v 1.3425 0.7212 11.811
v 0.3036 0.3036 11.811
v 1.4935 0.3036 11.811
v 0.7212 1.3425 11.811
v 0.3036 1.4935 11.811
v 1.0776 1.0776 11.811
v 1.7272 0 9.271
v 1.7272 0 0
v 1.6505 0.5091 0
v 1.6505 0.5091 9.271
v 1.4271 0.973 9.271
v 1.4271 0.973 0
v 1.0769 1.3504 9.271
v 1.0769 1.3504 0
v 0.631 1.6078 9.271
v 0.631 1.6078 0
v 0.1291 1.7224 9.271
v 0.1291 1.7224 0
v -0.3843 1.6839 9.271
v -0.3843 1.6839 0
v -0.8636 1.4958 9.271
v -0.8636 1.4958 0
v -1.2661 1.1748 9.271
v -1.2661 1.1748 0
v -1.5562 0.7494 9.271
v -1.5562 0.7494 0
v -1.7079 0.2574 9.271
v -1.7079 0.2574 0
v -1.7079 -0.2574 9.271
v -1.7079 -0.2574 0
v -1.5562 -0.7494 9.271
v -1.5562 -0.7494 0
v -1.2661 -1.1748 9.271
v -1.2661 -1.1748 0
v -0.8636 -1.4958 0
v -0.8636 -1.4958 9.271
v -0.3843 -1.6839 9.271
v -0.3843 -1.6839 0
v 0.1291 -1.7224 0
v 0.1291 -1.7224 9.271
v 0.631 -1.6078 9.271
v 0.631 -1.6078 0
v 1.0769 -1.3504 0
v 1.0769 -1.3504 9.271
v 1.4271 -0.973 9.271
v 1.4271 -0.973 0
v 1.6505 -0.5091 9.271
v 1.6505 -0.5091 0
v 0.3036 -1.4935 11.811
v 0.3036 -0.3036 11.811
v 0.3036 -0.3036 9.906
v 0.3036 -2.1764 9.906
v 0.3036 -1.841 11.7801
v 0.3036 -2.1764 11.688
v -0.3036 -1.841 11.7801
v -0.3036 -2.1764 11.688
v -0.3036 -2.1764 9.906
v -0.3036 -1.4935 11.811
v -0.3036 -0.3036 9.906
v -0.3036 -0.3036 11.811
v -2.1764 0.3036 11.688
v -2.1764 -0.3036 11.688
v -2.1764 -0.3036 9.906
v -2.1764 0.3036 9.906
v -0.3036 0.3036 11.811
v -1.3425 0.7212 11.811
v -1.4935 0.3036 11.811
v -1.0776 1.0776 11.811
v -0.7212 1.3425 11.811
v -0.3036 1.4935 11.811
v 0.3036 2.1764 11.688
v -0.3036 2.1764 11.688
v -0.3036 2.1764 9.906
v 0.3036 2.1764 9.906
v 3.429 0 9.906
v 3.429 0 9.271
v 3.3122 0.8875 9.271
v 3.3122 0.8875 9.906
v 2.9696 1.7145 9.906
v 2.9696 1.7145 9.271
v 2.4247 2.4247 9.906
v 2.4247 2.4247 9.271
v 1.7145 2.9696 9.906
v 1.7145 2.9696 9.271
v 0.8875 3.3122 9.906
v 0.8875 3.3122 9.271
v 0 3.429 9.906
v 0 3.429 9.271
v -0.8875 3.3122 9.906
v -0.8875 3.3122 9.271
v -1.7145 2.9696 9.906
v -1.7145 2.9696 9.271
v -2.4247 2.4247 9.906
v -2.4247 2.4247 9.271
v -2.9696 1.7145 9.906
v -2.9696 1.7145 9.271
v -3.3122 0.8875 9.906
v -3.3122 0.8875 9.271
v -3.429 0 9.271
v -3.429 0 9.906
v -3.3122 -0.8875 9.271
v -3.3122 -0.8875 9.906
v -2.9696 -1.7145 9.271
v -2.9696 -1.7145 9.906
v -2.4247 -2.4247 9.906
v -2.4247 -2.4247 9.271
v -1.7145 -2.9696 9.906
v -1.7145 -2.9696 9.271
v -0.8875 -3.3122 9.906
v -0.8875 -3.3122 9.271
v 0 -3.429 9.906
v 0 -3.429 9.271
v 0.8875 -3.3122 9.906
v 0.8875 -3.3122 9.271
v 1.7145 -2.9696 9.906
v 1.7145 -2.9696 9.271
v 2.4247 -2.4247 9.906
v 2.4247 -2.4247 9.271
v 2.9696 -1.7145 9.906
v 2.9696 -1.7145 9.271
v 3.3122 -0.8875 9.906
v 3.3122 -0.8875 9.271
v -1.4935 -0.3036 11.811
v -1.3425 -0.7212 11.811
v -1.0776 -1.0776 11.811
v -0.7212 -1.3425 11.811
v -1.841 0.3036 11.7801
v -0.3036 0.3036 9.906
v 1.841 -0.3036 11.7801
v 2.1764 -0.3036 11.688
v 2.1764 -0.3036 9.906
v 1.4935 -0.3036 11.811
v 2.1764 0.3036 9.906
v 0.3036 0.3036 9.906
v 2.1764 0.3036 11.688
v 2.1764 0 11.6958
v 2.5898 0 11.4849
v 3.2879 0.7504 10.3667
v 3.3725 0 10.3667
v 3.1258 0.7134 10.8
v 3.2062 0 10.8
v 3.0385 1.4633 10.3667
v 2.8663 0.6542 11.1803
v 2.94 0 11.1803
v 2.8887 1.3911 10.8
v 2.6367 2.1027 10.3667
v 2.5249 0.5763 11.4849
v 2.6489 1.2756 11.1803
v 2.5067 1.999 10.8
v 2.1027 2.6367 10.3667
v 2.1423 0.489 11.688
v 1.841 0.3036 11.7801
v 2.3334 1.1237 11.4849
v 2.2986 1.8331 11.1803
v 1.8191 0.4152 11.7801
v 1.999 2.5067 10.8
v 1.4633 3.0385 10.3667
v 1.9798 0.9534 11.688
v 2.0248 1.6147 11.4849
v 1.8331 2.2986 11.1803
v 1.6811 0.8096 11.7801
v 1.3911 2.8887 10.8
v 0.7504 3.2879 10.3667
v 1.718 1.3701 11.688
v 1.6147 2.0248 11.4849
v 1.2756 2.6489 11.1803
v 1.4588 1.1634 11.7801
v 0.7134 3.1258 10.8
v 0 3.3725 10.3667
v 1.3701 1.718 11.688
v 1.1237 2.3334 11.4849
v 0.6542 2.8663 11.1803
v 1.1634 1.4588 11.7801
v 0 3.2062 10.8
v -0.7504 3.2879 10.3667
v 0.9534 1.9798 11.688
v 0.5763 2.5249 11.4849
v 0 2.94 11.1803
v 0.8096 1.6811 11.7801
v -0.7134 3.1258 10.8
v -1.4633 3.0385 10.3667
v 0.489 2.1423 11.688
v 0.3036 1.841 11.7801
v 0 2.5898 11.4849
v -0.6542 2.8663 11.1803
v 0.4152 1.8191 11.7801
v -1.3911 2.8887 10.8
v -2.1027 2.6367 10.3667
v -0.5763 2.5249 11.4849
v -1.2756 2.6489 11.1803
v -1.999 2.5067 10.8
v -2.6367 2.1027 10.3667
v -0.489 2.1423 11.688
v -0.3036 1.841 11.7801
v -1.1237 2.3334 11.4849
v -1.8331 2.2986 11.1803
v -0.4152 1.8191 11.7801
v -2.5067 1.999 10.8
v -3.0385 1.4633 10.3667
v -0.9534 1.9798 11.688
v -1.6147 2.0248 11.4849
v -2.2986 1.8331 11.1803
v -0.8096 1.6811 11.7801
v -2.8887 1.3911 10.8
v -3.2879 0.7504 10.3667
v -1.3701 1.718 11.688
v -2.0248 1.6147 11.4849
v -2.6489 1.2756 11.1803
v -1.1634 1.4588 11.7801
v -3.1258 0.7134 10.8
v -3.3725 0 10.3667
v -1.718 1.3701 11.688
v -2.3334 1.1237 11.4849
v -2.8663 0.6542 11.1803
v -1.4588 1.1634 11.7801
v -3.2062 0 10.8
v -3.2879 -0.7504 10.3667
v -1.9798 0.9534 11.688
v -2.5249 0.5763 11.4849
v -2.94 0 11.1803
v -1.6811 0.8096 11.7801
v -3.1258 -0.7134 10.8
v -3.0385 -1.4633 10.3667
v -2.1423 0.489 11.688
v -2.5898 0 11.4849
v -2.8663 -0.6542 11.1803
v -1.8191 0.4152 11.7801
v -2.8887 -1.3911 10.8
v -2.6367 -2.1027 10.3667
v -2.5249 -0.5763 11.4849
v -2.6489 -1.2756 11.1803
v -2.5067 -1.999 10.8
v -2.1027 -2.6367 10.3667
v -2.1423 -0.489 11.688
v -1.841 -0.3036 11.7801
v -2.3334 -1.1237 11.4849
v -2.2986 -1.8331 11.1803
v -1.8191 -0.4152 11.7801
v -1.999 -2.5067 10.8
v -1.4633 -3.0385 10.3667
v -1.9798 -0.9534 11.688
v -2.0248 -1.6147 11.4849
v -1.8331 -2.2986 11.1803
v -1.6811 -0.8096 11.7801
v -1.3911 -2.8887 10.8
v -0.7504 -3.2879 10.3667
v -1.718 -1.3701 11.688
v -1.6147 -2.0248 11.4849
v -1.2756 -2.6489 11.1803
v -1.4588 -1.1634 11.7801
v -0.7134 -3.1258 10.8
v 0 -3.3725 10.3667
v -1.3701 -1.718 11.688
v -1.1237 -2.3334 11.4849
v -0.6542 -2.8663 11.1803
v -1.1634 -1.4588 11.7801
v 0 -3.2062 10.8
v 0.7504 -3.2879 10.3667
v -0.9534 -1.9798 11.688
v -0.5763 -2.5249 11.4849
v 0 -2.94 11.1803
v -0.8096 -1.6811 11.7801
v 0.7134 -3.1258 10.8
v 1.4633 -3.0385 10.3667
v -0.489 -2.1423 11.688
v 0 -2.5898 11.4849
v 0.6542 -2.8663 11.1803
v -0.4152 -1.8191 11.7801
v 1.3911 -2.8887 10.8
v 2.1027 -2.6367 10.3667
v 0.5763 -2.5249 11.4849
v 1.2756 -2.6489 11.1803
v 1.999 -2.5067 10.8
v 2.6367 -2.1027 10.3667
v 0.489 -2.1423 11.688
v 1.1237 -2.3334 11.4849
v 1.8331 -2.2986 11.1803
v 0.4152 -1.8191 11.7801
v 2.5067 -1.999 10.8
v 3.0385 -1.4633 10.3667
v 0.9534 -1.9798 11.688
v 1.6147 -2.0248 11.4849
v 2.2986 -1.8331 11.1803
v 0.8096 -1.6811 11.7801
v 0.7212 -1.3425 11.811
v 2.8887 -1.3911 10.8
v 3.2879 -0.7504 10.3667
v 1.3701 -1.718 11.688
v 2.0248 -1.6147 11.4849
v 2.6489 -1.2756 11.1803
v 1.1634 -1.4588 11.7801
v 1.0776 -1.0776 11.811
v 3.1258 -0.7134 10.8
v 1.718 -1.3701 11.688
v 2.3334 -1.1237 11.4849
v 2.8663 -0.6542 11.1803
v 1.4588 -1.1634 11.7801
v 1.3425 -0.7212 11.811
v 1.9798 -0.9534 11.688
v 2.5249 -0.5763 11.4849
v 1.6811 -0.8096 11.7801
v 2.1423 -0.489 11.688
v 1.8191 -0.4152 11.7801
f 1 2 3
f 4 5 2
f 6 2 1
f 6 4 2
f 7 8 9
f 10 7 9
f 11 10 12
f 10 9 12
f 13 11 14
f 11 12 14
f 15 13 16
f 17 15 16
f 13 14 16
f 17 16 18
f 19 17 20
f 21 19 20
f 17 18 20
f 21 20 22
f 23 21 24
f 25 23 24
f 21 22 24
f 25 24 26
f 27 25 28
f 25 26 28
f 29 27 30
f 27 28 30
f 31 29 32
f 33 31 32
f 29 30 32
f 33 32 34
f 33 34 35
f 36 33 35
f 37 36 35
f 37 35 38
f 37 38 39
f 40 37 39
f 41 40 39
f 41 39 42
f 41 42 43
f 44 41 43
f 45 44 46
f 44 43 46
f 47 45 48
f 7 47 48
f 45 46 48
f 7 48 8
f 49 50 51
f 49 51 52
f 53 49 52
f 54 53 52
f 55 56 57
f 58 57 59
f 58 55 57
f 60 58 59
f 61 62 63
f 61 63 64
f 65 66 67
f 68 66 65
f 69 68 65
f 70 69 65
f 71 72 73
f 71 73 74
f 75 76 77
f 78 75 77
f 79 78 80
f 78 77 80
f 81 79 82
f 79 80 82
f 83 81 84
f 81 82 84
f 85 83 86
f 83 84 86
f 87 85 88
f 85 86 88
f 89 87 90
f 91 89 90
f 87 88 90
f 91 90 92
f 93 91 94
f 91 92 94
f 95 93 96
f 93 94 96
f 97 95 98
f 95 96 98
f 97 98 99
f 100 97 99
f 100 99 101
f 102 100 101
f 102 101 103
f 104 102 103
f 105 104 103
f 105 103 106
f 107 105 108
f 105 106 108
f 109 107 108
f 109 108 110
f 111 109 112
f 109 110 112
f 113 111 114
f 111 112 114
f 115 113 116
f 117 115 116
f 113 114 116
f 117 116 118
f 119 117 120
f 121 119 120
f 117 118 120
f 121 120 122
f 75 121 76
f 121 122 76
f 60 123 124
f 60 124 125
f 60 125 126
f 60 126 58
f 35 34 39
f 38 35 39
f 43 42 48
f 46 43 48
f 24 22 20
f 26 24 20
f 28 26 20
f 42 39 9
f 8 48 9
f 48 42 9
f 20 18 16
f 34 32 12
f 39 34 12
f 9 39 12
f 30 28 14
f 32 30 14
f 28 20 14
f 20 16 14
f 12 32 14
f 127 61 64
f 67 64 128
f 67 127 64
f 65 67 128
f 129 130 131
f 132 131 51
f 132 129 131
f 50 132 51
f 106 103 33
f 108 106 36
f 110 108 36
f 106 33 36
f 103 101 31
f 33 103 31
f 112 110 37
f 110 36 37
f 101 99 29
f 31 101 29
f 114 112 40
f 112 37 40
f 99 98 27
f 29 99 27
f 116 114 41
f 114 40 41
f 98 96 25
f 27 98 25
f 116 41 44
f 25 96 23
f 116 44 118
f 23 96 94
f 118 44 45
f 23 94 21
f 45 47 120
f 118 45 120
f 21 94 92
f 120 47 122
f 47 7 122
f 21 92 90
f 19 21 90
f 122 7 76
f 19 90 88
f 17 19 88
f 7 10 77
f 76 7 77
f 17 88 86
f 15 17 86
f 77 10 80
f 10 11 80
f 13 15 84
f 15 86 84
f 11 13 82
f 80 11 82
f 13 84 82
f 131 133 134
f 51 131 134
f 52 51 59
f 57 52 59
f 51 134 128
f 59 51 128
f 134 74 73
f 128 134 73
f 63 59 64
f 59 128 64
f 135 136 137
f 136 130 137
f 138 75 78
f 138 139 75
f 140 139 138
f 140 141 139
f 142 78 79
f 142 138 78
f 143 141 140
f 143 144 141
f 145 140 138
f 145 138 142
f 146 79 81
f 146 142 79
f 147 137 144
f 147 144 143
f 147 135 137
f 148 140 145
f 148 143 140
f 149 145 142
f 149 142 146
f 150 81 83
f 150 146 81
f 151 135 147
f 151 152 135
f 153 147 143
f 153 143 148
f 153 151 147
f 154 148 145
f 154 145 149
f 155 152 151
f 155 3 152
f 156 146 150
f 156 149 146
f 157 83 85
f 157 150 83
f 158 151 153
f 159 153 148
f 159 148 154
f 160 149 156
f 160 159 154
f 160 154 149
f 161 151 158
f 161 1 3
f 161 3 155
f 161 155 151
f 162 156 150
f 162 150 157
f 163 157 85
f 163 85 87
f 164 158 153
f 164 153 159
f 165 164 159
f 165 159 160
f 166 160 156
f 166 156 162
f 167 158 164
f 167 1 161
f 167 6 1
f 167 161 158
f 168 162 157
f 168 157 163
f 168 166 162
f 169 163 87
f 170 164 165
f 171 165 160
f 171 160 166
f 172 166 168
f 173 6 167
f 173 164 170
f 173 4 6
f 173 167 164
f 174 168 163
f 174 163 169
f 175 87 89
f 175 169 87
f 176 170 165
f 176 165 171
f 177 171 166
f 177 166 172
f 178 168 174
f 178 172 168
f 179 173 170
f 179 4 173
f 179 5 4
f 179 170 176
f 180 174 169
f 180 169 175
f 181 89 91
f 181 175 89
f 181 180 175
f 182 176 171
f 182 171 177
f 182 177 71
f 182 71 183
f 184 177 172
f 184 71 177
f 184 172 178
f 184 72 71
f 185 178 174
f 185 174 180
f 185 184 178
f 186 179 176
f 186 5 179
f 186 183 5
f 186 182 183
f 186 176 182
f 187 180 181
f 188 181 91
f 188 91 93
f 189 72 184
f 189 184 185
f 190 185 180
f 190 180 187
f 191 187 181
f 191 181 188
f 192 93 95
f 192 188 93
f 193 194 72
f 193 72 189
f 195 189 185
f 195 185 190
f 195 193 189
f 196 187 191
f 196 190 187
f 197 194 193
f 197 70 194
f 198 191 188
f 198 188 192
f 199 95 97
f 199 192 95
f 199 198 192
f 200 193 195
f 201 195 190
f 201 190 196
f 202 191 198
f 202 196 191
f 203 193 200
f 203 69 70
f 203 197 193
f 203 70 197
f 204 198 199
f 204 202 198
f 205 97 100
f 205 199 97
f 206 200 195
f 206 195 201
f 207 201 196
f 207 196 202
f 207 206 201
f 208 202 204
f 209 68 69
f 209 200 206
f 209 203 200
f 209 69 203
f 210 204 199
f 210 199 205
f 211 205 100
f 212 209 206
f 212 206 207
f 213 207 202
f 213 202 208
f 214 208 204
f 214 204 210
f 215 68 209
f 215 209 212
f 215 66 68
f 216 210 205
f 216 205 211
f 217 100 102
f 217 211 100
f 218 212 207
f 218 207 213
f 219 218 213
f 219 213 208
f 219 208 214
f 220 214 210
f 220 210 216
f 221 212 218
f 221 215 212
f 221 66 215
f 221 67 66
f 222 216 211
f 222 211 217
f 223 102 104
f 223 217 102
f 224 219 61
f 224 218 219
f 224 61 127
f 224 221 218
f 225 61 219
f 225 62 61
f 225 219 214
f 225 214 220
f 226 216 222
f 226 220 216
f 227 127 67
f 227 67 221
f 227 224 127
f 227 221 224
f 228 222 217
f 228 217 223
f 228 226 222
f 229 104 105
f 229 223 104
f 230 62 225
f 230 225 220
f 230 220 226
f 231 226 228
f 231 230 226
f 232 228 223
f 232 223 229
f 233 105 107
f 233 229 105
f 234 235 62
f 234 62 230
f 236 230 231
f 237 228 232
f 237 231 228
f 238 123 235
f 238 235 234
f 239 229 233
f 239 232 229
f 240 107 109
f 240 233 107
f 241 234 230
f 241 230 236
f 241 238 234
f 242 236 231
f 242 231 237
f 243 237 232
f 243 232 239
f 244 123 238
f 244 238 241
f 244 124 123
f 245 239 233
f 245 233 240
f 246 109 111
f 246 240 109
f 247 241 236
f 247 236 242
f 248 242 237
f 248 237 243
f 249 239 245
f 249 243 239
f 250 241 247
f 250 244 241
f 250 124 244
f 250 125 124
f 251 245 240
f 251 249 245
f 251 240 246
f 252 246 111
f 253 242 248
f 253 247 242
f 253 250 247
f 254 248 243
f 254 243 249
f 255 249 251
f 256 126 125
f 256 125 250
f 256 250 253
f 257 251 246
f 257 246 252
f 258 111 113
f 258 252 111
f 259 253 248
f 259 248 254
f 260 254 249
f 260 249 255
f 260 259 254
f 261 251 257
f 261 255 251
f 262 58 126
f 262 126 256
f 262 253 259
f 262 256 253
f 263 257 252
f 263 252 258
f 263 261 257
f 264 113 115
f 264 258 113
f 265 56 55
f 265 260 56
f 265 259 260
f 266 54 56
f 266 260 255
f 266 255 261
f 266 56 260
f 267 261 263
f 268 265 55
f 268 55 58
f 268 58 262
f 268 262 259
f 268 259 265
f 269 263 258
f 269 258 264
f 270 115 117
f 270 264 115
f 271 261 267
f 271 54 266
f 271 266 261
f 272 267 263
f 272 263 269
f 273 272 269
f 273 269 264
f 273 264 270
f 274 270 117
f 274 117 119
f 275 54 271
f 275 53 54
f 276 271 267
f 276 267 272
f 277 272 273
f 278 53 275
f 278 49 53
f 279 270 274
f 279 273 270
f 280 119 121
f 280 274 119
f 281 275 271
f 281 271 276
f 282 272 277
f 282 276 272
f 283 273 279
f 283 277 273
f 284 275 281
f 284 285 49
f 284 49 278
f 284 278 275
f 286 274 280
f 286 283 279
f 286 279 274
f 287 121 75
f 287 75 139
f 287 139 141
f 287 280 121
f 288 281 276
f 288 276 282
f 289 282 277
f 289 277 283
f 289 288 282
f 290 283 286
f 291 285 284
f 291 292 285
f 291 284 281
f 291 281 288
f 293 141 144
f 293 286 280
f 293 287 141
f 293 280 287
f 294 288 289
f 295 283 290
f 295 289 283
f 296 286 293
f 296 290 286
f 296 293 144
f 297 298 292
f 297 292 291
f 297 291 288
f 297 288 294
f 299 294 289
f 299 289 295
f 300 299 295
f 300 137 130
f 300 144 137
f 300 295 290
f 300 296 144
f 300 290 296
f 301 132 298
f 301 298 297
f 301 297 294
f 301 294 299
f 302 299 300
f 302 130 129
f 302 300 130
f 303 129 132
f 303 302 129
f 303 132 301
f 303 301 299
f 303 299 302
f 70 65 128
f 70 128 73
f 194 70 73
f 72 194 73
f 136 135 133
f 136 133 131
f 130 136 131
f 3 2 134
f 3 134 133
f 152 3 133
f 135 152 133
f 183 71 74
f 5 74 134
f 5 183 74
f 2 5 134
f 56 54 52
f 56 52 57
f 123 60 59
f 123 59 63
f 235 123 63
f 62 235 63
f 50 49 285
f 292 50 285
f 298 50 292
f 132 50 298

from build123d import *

# Parameters (mm, degrees)
SKETCH1_R           = 1.7272
BOSS_EXTRUDE1_DEPTH = 9.271
SKETCH2_R           = 3.429
BOSS_EXTRUDE2_DEPTH = 2.54
FILLET1_R           = 1.905
CUT_EXTRUDE1_DEPTH  = 1.905


with BuildPart() as part:
    # Sketch1 → Boss-Extrude1 (new body)
    with BuildSketch(Plane.XY):
        Circle(SKETCH1_R)
    extrude(amount=BOSS_EXTRUDE1_DEPTH)

    # Sketch2 → Boss-Extrude2 (add)
    with BuildSketch(Plane.XY.offset(9.271)):
        Circle(SKETCH2_R)
    extrude(amount=BOSS_EXTRUDE2_DEPTH)

    # Fillet1
    fillet1_edges = [part.edges().sort_by_distance(p)[0] for p in [
        (-3.429, 0, 11.811),
    ]]
    fillet(fillet1_edges, radius=FILLET1_R)

    # Sketch3 → Cut-Extrude1 (cut)
    with BuildSketch(Plane.XY.offset(11.811)):
        Polygon((-0.303567799, 0.303567799), (-0.303567799, 2.17637078), (0.303567799, 2.17637078), (0.303567799, 0.303567799), (2.17637078, 0.303567799), (2.17637078, -0.303567799), (0.303567799, -0.303567799), (0.303567799, -2.17637078), (-0.303567799, -2.17637078), (-0.303567799, -0.303567799), (-2.17637078, -0.303567799), (-2.17637078, 0.303567799), align=None)
    extrude(amount=-CUT_EXTRUDE1_DEPTH, mode=Mode.SUBTRACT)


solid = part.part
